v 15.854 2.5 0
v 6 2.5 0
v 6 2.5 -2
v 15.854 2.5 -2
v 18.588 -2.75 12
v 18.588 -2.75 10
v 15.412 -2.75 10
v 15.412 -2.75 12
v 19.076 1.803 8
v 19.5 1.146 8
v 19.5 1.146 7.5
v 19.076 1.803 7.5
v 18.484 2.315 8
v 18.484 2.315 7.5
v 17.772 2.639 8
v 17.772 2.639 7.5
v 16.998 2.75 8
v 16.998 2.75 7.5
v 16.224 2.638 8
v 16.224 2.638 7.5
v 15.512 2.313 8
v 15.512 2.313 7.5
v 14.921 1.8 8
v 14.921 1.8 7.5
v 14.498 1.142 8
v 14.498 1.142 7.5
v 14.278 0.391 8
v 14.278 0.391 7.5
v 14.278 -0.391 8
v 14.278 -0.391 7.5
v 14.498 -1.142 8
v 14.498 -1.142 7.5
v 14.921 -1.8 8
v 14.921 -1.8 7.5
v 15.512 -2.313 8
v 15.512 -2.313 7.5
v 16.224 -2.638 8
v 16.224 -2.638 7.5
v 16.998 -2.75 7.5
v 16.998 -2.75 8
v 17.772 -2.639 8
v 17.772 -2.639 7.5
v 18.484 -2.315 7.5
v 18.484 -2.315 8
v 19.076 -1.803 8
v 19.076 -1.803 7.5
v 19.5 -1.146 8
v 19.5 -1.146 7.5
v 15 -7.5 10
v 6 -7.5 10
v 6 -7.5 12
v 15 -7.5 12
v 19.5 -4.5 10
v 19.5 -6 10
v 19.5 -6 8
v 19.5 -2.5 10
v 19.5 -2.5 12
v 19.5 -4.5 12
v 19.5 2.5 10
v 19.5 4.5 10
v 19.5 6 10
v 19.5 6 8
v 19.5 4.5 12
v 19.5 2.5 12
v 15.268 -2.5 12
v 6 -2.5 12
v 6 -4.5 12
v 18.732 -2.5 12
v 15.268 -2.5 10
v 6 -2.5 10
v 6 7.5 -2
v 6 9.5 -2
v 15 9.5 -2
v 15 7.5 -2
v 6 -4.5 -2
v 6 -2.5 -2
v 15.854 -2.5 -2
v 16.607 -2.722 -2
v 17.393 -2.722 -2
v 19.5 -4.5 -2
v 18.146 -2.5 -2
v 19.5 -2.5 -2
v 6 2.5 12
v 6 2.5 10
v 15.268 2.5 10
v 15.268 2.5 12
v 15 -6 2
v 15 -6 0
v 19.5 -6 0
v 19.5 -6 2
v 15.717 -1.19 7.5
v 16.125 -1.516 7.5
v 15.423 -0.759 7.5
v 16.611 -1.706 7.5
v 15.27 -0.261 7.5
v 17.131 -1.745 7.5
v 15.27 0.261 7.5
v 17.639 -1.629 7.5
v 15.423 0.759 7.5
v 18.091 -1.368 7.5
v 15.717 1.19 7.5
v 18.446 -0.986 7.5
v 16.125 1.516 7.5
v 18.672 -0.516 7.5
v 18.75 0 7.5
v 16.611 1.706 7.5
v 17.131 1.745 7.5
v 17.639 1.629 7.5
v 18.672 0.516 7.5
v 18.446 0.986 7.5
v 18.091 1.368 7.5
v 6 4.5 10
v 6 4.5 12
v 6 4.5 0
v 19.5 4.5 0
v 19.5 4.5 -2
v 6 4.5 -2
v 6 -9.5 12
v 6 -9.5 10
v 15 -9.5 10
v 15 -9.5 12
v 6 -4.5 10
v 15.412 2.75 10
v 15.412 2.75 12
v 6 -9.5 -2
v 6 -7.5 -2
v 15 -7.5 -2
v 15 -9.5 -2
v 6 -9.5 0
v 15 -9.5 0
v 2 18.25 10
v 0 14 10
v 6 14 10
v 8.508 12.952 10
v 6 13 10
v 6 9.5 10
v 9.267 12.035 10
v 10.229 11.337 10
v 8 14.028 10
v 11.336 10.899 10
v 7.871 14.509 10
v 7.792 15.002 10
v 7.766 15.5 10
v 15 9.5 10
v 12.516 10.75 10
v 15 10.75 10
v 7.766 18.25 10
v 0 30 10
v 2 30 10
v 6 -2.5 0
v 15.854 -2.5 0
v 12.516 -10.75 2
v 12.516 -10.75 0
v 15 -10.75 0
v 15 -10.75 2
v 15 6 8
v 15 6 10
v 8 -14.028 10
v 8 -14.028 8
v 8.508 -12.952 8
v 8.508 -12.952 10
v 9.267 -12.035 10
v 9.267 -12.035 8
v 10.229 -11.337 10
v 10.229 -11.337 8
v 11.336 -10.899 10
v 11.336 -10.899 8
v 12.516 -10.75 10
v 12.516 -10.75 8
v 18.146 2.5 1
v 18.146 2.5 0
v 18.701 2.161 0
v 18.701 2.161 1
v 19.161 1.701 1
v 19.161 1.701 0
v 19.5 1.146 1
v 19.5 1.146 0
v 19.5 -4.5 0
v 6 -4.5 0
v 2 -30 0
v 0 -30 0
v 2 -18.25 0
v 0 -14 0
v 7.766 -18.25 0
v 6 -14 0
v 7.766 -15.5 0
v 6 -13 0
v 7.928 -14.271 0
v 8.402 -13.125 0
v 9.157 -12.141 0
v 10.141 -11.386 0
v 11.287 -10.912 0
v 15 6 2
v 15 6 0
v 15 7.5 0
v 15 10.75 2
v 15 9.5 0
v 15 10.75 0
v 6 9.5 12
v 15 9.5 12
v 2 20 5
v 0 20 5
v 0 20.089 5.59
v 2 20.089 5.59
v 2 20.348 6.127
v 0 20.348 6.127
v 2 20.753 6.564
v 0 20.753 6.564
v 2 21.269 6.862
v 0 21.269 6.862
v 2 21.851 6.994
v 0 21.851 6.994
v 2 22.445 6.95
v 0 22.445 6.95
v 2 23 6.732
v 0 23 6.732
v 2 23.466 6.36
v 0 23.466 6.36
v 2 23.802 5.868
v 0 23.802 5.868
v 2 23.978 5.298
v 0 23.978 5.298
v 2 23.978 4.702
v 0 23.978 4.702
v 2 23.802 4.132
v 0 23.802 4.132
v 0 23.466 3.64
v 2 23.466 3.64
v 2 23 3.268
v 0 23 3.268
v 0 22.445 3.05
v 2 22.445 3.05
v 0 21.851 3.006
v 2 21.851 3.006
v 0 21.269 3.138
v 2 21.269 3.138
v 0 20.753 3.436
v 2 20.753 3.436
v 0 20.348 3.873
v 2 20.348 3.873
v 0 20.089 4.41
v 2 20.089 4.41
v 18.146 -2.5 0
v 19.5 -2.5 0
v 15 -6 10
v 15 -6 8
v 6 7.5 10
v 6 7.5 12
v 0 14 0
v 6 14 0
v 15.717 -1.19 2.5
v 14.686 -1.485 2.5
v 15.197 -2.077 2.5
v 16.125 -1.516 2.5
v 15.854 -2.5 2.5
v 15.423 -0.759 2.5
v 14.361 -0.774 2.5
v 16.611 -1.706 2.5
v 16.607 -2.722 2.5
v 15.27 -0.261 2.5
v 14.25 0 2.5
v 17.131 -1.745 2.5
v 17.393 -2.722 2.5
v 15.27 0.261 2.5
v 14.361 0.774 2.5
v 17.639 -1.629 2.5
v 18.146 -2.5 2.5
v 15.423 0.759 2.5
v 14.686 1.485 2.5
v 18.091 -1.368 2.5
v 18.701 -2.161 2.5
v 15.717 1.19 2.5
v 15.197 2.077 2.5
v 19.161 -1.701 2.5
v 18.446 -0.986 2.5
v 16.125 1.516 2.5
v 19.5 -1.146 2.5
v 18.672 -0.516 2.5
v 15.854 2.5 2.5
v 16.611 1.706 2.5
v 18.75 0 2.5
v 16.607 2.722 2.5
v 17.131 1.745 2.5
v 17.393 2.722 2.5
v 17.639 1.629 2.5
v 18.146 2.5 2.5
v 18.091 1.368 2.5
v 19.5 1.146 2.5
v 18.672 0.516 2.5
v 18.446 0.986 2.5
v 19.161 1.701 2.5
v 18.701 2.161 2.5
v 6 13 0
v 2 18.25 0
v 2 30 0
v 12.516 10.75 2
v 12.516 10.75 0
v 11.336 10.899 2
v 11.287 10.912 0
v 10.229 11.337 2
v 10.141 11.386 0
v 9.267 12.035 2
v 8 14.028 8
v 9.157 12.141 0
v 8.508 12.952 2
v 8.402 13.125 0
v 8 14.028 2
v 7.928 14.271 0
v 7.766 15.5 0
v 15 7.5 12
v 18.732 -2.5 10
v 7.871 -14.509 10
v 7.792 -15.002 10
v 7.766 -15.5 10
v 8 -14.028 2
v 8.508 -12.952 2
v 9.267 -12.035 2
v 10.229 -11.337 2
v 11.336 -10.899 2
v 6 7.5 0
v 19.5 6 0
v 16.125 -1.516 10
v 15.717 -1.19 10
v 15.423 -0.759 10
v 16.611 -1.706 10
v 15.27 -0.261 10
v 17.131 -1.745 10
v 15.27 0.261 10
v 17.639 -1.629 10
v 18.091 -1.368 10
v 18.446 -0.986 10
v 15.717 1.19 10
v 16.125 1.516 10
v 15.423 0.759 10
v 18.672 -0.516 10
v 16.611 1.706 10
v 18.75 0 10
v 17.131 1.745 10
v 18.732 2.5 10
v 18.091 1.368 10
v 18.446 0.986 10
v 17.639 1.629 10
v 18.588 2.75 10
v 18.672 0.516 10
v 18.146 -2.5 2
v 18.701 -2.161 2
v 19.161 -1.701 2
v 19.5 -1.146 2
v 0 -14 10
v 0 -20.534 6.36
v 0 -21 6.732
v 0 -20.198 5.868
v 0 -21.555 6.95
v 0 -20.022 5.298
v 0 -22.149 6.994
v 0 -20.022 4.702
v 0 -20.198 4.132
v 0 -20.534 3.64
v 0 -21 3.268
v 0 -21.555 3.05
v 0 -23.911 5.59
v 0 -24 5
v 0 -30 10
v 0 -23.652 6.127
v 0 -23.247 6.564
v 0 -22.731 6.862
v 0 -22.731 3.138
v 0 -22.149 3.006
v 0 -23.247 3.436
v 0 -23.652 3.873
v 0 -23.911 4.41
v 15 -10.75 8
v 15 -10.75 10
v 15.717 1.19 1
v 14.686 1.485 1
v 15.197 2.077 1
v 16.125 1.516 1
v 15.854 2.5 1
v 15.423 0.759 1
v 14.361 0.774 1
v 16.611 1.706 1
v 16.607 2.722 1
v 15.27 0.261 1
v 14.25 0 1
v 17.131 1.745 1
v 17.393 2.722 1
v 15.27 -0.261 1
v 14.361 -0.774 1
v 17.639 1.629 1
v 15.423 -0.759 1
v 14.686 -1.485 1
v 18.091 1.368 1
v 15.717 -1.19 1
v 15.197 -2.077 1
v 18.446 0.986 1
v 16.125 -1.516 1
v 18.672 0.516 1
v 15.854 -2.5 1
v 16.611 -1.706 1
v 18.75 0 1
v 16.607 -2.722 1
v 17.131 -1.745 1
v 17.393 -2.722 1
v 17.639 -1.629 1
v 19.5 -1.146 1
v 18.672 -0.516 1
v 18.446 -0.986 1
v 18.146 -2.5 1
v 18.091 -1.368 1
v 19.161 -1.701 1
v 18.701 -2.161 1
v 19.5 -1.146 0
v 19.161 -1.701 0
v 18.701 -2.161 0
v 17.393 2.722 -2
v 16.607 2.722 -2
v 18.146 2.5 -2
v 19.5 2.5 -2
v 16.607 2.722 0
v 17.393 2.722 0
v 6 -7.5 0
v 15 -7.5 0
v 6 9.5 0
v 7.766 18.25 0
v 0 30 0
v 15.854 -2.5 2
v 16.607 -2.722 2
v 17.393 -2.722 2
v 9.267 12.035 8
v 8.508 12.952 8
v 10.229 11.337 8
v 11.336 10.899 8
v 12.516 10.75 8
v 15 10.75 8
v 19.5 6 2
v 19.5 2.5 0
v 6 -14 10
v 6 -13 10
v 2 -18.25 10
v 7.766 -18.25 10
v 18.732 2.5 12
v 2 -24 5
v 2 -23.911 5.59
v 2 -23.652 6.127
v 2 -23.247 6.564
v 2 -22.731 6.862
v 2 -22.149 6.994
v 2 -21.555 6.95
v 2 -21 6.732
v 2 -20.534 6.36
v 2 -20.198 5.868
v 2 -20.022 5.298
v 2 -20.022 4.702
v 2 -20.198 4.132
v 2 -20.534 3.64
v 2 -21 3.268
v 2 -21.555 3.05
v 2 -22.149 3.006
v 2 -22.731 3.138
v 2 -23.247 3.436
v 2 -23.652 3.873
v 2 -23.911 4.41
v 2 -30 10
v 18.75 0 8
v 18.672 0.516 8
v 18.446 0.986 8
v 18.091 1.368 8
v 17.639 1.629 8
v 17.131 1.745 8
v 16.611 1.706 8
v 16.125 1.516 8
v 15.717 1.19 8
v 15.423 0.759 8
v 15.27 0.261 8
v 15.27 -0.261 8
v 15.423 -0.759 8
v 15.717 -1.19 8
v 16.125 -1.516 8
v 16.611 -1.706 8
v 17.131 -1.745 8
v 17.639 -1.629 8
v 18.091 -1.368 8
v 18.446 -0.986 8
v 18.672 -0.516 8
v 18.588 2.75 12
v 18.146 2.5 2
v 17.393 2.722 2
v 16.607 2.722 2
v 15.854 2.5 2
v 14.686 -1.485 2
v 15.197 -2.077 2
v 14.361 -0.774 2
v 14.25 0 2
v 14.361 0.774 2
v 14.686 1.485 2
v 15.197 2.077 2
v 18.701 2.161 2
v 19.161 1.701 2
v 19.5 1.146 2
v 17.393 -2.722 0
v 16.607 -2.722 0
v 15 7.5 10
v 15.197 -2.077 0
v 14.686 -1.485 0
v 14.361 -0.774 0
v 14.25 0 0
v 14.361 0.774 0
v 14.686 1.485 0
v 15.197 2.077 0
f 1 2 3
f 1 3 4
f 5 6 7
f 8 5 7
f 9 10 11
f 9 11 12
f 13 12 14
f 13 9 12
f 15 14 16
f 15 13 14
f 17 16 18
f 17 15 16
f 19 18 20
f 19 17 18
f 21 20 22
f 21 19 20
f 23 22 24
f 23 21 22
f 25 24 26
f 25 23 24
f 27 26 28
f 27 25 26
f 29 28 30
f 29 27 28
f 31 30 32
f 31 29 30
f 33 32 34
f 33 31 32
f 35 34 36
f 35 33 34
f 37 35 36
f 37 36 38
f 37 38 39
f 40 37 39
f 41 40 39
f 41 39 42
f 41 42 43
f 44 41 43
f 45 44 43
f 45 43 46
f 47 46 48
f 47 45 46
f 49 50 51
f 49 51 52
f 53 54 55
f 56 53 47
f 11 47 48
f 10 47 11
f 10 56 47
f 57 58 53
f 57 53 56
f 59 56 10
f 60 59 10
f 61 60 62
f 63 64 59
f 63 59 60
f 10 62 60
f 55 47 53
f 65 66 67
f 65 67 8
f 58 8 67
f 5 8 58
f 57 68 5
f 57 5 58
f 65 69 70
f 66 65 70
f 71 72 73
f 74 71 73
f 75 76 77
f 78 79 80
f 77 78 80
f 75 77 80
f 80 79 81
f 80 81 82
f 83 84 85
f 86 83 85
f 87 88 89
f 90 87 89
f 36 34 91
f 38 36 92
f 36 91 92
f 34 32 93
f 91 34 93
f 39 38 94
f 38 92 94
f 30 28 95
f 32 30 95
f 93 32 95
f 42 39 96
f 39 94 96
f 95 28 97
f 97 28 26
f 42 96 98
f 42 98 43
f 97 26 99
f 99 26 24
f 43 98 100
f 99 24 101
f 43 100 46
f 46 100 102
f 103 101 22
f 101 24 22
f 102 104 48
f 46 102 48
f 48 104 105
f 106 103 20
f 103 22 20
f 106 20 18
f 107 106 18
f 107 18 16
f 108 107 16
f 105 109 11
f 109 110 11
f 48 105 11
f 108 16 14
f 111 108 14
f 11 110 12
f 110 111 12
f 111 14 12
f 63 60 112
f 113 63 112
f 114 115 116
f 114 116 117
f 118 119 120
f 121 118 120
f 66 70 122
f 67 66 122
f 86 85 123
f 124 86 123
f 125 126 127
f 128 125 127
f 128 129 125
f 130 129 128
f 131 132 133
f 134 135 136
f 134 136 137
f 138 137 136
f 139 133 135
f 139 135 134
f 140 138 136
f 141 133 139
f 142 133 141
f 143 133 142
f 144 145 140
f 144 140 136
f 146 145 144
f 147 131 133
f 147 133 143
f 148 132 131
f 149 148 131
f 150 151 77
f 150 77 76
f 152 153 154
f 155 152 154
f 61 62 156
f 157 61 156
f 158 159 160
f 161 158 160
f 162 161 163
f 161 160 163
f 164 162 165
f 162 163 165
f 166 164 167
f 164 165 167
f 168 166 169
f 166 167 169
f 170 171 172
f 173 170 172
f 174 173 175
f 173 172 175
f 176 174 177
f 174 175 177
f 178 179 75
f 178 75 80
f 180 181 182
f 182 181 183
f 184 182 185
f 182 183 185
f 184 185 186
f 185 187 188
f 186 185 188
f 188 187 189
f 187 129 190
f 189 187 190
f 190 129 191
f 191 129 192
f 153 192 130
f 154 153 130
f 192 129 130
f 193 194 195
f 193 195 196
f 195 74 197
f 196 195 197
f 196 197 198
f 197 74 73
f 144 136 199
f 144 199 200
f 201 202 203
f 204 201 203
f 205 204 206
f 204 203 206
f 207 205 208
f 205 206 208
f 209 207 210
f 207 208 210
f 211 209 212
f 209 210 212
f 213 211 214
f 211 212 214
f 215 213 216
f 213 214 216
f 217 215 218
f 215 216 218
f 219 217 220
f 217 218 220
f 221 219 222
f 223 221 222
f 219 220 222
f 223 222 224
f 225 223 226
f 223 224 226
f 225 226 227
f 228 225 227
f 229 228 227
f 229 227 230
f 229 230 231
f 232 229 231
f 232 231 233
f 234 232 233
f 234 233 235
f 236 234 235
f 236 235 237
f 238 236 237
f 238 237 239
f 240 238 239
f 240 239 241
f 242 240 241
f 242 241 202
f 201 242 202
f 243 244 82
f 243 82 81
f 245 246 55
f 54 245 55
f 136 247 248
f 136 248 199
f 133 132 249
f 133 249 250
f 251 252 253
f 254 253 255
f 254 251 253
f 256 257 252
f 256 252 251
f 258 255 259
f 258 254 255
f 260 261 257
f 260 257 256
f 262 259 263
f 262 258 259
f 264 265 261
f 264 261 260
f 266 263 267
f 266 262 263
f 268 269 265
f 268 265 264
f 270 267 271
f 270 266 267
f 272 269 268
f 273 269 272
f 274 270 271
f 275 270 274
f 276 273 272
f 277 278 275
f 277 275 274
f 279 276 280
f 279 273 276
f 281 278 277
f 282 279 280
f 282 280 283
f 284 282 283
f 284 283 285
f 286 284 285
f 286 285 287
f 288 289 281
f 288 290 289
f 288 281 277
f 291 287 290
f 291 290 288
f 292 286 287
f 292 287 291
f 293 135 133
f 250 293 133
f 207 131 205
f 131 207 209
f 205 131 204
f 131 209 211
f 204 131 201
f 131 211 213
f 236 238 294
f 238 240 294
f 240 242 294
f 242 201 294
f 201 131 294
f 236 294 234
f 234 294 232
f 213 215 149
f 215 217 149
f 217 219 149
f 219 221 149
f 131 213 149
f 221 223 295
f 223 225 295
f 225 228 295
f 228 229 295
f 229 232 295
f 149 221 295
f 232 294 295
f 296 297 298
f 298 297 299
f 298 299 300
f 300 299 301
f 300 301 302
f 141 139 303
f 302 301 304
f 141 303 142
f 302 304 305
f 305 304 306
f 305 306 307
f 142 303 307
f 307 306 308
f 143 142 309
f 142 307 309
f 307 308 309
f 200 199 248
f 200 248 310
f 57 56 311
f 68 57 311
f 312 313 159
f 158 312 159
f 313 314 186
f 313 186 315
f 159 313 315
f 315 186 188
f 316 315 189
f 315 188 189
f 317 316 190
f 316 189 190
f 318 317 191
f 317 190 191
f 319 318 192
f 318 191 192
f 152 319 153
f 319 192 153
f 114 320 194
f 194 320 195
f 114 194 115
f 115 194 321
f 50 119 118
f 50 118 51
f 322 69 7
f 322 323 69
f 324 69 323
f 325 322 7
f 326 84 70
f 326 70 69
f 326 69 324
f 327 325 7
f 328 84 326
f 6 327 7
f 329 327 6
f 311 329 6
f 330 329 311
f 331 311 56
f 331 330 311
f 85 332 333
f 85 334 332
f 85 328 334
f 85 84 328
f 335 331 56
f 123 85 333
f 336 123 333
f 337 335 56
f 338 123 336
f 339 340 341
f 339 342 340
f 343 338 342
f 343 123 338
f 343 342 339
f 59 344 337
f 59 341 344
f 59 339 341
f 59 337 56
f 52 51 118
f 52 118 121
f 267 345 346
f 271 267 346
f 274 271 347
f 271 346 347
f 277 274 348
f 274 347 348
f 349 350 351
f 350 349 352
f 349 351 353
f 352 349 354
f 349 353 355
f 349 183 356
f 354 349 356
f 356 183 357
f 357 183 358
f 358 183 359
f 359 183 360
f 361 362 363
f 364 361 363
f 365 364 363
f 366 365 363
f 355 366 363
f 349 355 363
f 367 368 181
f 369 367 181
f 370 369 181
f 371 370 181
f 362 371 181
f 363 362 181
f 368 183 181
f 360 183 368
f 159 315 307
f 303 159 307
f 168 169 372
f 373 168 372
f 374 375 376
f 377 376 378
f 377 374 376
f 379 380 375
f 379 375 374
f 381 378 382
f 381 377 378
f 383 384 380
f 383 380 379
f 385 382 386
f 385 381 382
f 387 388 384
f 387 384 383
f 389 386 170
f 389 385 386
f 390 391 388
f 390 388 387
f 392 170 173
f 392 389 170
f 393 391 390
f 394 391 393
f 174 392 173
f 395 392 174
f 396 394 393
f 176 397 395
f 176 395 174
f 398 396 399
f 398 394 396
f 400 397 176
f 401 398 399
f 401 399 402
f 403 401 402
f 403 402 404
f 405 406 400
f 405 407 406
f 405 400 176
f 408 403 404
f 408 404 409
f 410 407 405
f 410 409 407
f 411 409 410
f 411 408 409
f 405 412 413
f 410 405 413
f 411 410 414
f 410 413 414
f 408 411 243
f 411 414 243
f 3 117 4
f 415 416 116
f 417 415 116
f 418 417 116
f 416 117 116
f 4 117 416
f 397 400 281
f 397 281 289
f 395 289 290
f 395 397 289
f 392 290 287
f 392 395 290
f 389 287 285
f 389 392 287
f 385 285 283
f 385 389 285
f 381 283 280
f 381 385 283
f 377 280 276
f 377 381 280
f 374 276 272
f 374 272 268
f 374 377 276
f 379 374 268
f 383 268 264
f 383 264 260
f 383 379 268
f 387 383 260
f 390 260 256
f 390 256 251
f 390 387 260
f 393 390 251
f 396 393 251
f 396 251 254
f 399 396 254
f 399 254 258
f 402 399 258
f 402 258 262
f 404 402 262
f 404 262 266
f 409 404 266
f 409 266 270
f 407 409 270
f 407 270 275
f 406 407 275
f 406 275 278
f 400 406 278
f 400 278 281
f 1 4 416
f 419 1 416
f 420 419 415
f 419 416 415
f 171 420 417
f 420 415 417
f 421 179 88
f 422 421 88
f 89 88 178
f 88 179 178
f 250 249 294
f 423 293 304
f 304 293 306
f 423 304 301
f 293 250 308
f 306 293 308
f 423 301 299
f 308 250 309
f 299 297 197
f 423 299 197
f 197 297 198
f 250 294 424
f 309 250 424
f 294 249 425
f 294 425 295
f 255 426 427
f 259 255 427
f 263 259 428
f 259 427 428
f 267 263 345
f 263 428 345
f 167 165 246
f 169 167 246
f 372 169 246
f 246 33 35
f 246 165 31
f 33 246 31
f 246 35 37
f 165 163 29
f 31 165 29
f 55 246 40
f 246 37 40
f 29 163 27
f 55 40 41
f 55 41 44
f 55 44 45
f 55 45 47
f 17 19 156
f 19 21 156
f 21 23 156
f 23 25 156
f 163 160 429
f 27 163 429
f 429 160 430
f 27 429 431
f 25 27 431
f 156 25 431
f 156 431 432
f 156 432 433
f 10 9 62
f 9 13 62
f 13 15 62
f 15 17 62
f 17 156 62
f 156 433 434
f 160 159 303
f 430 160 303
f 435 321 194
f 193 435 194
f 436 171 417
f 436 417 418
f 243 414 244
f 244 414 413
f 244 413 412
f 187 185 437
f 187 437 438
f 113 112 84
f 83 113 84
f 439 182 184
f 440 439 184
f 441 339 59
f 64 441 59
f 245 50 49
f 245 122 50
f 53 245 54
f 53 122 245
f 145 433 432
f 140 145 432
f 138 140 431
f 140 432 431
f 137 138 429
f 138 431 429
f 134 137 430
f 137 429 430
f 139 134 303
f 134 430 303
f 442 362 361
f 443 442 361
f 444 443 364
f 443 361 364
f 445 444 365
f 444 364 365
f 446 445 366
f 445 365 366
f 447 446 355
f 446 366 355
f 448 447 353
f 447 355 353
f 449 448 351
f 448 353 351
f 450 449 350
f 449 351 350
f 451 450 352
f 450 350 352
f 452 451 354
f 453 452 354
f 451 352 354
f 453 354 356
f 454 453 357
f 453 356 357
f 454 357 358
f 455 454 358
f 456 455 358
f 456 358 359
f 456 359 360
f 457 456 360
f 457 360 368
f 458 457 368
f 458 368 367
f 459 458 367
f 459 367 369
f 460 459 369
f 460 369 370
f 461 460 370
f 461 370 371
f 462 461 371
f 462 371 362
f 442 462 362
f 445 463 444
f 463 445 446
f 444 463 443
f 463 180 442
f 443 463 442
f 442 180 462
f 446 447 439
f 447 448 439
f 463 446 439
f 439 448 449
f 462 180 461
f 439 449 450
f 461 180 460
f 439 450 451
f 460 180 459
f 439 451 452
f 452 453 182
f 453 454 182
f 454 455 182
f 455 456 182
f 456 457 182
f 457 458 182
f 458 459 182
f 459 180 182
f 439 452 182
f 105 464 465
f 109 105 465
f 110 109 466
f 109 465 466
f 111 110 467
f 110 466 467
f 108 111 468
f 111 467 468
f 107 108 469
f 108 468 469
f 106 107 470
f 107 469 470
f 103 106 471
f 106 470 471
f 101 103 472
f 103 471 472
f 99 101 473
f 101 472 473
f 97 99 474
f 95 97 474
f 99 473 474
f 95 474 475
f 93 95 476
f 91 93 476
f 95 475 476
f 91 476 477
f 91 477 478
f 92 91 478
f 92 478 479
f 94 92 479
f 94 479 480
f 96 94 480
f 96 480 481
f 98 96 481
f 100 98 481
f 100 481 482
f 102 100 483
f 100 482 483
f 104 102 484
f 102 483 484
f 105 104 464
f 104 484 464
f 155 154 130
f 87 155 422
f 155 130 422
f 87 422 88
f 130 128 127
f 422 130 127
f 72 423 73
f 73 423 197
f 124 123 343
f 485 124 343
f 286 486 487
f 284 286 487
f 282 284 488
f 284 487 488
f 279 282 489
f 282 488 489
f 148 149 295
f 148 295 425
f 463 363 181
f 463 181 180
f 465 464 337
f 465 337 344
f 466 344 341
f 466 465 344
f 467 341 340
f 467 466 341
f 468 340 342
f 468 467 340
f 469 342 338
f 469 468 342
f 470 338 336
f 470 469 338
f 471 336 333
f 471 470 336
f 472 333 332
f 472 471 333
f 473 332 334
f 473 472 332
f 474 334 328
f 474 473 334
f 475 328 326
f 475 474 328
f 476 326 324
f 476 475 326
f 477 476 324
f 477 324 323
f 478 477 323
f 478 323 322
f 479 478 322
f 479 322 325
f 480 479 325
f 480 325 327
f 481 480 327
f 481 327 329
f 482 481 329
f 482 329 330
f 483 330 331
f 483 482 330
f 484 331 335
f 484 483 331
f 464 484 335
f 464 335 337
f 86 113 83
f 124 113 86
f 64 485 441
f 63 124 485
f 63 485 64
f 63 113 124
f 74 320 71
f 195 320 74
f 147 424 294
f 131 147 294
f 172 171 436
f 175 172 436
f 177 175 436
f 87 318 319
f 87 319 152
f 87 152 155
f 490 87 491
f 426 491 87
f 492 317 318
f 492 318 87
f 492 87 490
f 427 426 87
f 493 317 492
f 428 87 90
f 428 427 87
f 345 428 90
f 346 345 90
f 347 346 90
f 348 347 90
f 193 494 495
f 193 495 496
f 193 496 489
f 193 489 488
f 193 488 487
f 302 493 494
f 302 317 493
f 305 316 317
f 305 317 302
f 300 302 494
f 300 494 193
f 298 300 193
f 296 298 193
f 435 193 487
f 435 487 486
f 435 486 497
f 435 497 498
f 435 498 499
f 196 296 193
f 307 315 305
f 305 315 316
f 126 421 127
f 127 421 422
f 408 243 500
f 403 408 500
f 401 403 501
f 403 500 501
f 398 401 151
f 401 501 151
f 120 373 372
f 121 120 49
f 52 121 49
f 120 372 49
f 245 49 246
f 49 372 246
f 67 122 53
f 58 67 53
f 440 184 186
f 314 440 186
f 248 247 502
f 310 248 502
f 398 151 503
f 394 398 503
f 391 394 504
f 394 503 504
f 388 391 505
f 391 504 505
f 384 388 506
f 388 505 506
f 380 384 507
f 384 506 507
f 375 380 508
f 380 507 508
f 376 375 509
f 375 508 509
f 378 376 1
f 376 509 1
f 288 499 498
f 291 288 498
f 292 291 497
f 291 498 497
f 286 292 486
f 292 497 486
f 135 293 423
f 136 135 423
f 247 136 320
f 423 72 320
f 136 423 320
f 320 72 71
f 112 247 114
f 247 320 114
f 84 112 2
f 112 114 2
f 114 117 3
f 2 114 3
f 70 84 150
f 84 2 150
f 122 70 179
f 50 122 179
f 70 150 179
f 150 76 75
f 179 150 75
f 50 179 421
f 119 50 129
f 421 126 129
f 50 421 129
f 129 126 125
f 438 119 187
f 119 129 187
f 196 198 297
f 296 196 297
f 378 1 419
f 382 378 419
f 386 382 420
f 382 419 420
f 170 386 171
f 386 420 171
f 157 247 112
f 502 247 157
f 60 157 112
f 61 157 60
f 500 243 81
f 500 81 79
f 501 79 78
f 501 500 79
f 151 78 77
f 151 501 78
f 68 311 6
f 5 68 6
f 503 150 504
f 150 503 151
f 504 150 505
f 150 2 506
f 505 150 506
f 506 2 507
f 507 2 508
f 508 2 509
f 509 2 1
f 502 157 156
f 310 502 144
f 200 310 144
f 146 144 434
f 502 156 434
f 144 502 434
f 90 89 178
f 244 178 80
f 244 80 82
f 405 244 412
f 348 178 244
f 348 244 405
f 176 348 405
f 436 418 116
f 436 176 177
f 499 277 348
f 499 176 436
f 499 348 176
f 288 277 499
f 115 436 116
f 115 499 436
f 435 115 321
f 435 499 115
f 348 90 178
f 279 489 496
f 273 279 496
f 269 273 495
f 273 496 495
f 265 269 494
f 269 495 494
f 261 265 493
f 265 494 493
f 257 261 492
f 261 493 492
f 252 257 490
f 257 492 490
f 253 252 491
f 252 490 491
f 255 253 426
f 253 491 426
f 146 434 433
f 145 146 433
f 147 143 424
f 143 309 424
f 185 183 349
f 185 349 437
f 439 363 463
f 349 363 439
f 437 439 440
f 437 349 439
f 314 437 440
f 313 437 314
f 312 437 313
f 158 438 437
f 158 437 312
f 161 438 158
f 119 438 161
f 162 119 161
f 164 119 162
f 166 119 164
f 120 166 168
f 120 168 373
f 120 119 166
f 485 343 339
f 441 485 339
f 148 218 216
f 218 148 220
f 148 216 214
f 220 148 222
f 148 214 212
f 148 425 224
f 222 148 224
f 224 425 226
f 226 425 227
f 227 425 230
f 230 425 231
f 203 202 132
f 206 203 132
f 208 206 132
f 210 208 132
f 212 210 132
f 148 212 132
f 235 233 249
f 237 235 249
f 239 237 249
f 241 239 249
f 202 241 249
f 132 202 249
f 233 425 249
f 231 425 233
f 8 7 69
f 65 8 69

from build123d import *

# Parameters (mm, degrees)
F0_W      = 15
F0_H      = 2
F0_R      = 1.75
F1_DEPTH  = 2
F2_DEPTH  = 2
F3_DEPTH  = 2.5
F4_W      = 6
F4_H      = 26
F5_DEPTH  = 7
F6_DEPTH  = 6
F7_R      = 1.75
F8_DEPTH  = 2
F9_DEPTH  = 0.5
F10_W     = 9
F10_H     = 2
F11_DEPTH = 2
F12_R     = 2
F13_DEPTH = 25
F14_R     = 1.75
F15_DEPTH = 1
F16_W     = 6
F16_H     = 1
F17_DEPTH = 15


with BuildPart() as f1:
    # F0 (on Top) → F1 (new body)
    with BuildSketch(Plane.XY):
        with BuildLine():
            Line((15, -9.5), (0, -9.5))
            Line((0, -9.5), (0, -30))
            Line((0, -30), (2, -30))
            Line((2, -30), (2, -18.25))
            Line((2, -18.25), (7.7660733269, -18.25))
            Line((7.7660733269, -18.25), (7.7660733269, -15.5))
            ThreePointArc((7.7660733269, -15.5), (9.1573161163, -12.1412427894), (12.5160733269, -10.75))
            Line((12.5160733269, -10.75), (15, -10.75))
            Line((15, -10.75), (15, -9.5))
        make_face()
        with BuildLine():
            Line((0, 30), (0, 9.5))
            Line((0, 9.5), (15, 9.5))
            Line((15, 9.5), (15, 10.75))
            Line((15, 10.75), (12.5160733269, 10.75))
            ThreePointArc((12.5160733269, 10.75), (9.1573161163, 12.1412427894), (7.7660733269, 15.5))
            Line((7.7660733269, 15.5), (7.7660733269, 18.25))
            Line((7.7660733269, 18.25), (2, 18.25))
            Line((2, 18.25), (2, 30))
            Line((2, 30), (0, 30))
        make_face()
        Polygon((19.5, -5.8877859777), (19.5, -4.617), (19.5, -4.5), (0, -4.5), (0, -7.5), (15, -7.5), (15, -7), (15, -6), (19.5, -6), align=None)
        with BuildLine():
            Line((18.1456439237, -2.5), (19.5, -2.5))
            Line((19.5, -2.5), (19.5, -1.1456439237))
            ThreePointArc((19.5, -1.1456439237), (18.9445436483, -1.9445436483), (18.1456439237, -2.5))
        make_face()
        with Locations((7.5, -8.5)):
            Rectangle(F0_W, F0_H)
        with Locations((7.5, 8.5)):
            Rectangle(F0_W, F0_H)
        Polygon((0, 7.5), (0, 4.5), (19.5, 4.5), (19.5, 4.617), (19.5, 5.8877859777), (19.5, 6), (15, 6), (15, 7), (15, 7.5), align=None)
        with BuildLine():
            ThreePointArc((18.1456439237, 2.5), (18.9445436483, 1.9445436483), (19.5, 1.1456439237))
            Line((19.5, 1.1456439237), (19.5, 2.5))
            Line((19.5, 2.5), (18.1456439237, 2.5))
        make_face()
        with BuildLine():
            Line((0, 0), (0, -2.5))
            Line((0, -2.5), (15.8543560763, -2.5))
            ThreePointArc((15.8543560763, -2.5), (14.25, 0), (15.8543560763, 2.5))
            Line((15.8543560763, 2.5), (0, 2.5))
            Line((0, 2.5), (0, 0))
        make_face()
        with BuildLine():
            Line((0, -4.5), (19.5, -4.5))
            Line((19.5, -4.5), (19.5, -2.5))
            Line((19.5, -2.5), (18.1456439237, -2.5))
            ThreePointArc((18.1456439237, -2.5), (17, -2.75), (15.8543560763, -2.5))
            Line((15.8543560763, -2.5), (0, -2.5))
            Line((0, -2.5), (0, -4.5))
        make_face()
        with BuildLine():
            Line((0, 2.5), (15.8543560763, 2.5))
            ThreePointArc((15.8543560763, 2.5), (17, 2.75), (18.1456439237, 2.5))
            Line((18.1456439237, 2.5), (19.5, 2.5))
            Line((19.5, 2.5), (19.5, 4.5))
            Line((19.5, 4.5), (0, 4.5))
            Line((0, 4.5), (0, 2.5))
        make_face()
        with BuildLine():
            ThreePointArc((18.1456439237, -2.5), (18.9445436483, -1.9445436483), (19.5, -1.1456439237))
            Line((19.5, -1.1456439237), (19.5, 0.8877859777))
            Line((19.5, 0.8877859777), (19.5, 1.1456439237))
            ThreePointArc((19.5, 1.1456439237), (18.9445436483, 1.9445436483), (18.1456439237, 2.5))
            Line((18.1456439237, 2.5), (15.8543560763, 2.5))
            ThreePointArc((15.8543560763, 2.5), (14.25, 0), (15.8543560763, -2.5))
            Line((15.8543560763, -2.5), (18.1456439237, -2.5))
        make_face()
        with Locations((17, 0)):
            Circle(F0_R, mode=Mode.SUBTRACT)
    extrude(amount=F1_DEPTH)

    # F0 (on Top) → F2 (join)
    with BuildSketch(Plane.XY):
        with Locations((7.5, -8.5)):
            Rectangle(F0_W, F0_H)
        with BuildLine():
            Line((0, -4.5), (19.5, -4.5))
            Line((19.5, -4.5), (19.5, -2.5))
            Line((19.5, -2.5), (18.1456439237, -2.5))
            ThreePointArc((18.1456439237, -2.5), (17, -2.75), (15.8543560763, -2.5))
            Line((15.8543560763, -2.5), (0, -2.5))
            Line((0, -2.5), (0, -4.5))
        make_face()
        with BuildLine():
            Line((0, 2.5), (15.8543560763, 2.5))
            ThreePointArc((15.8543560763, 2.5), (17, 2.75), (18.1456439237, 2.5))
            Line((18.1456439237, 2.5), (19.5, 2.5))
            Line((19.5, 2.5), (19.5, 4.5))
            Line((19.5, 4.5), (0, 4.5))
            Line((0, 4.5), (0, 2.5))
        make_face()
        with Locations((7.5, 8.5)):
            Rectangle(F0_W, F0_H)
    extrude(amount=-F2_DEPTH)

    # F0 (on Top) → F3 (join)
    with BuildSketch(Plane.XY):
        with BuildLine():
            ThreePointArc((18.1456439237, -2.5), (18.9445436483, -1.9445436483), (19.5, -1.1456439237))
            Line((19.5, -1.1456439237), (19.5, 0.8877859777))
            Line((19.5, 0.8877859777), (19.5, 1.1456439237))
            ThreePointArc((19.5, 1.1456439237), (18.9445436483, 1.9445436483), (18.1456439237, 2.5))
            Line((18.1456439237, 2.5), (15.8543560763, 2.5))
            ThreePointArc((15.8543560763, 2.5), (14.25, 0), (15.8543560763, -2.5))
            Line((15.8543560763, -2.5), (18.1456439237, -2.5))
        make_face()
        with Locations((17, 0)):
            Circle(F0_R, mode=Mode.SUBTRACT)
        with BuildLine():
            ThreePointArc((15.8543560763, -2.5), (17, -2.75), (18.1456439237, -2.5))
            Line((18.1456439237, -2.5), (15.8543560763, -2.5))
        make_face()
        with BuildLine():
            ThreePointArc((18.1456439237, 2.5), (17, 2.75), (15.8543560763, 2.5))
            Line((15.8543560763, 2.5), (18.1456439237, 2.5))
        make_face()
    extrude(amount=F3_DEPTH)

    # F4 (on face) → F5 (cut)
    with BuildSketch(Plane.XY.offset(2)):
        with Locations((3, 0)):
            Rectangle(F4_W, F4_H)
    extrude(amount=-F5_DEPTH, mode=Mode.SUBTRACT)

    # F4 (on face) → F6 (join)
    with BuildSketch(Plane.XY.offset(2)):
        with BuildLine():
            Line((8, -7.5), (8, -4.5))
            Line((8, -4.5), (8, -2.5))
            Line((8, -2.5), (8, 2.5))
            Line((8, 2.5), (8, 4.5))
            Line((8, 4.5), (8, 7.5))
            Line((8, 7.5), (8, 9.5))
            Line((8, 9.5), (8, 14.0277290651))
            ThreePointArc((8, 14.0277290651), (7.8249195082, 14.7546303947), (7.7660733269, 15.5))
            Line((7.7660733269, 15.5), (7.7660733269, 18.25))
            Line((7.7660733269, 18.25), (2, 18.25))
            Line((2, 18.25), (2, 30))
            Line((2, 30), (0, 30))
            Line((0, 30), (0, 13))
            Line((0, 13), (6, 13))
            Line((6, 13), (6, -13))
            Line((6, -13), (0, -13))
            Line((0, -13), (0, -30))
            Line((0, -30), (2, -30))
            Line((2, -30), (2, -18.25))
            Line((2, -18.25), (7.7660733269, -18.25))
            Line((7.7660733269, -18.25), (7.7660733269, -15.5))
            ThreePointArc((7.7660733269, -15.5), (7.8249195082, -14.7546303947), (8, -14.0277290651))
            Line((8, -14.0277290651), (8, -9.5))
            Line((8, -9.5), (8, -7.5))
        make_face()
    extrude(amount=F6_DEPTH)

    # F7 (on face) → F8 (join)
    with BuildSketch(Plane.XY.offset(8)):
        with BuildLine():
            ThreePointArc((7.7660733269, -15.5), (7.8249195082, -14.7546303947), (8, -14.0277290651))
            Line((8, -14.0277290651), (8, 14.0277290651))
            ThreePointArc((8, 14.0277290651), (7.8249195082, 14.7546303947), (7.7660733269, 15.5))
            Line((7.7660733269, 15.5), (7.7660733269, 18.25))
            Line((7.7660733269, 18.25), (2, 18.25))
            Line((2, 18.25), (2, 30))
            Line((2, 30), (0, 30))
            Line((0, 30), (0, 13))
            Line((0, 13), (6, 13))
            Line((6, 13), (6, -13))
            Line((6, -13), (0, -13))
            Line((0, -13), (0, -30))
            Line((0, -30), (2, -30))
            Line((2, -30), (2, -18.25))
            Line((2, -18.25), (7.7660733269, -18.25))
            Line((7.7660733269, -18.25), (7.7660733269, -15.5))
        make_face()
        with BuildLine():
            Line((19.5, -5.8877859777), (19.5, -4.617))
            Line((19.5, -4.617), (19.5, -1.1456439237))
            ThreePointArc((19.5, -1.1456439237), (14.25, 0), (19.5, 1.1456439237))
            Line((19.5, 1.1456439237), (19.5, 4.617))
            Line((19.5, 4.617), (19.5, 5.8877859777))
            Line((19.5, 5.8877859777), (19.5, 6))
            Line((19.5, 6), (15, 6))
            Line((15, 6), (15, 7))
            Line((15, 7), (15, 10.75))
            Line((15, 10.75), (12.5160733269, 10.75))
            ThreePointArc((12.5160733269, 10.75), (9.7259825525, 11.6557974207), (8, 14.0277290651))
            Line((8, 14.0277290651), (8, -14.0277290651))
            ThreePointArc((8, -14.0277290651), (9.7259825525, -11.6557974207), (12.5160733269, -10.75))
            Line((12.5160733269, -10.75), (15, -10.75))
            Line((15, -10.75), (15, -7))
            Line((15, -7), (15, -6))
            Line((15, -6), (19.5, -6))
            Line((19.5, -6), (19.5, -5.8877859777))
        make_face()
        with BuildLine():
            ThreePointArc((19.5, 1.1456439237), (14.25, 0), (19.5, -1.1456439237))
            Line((19.5, -1.1456439237), (19.5, 0.8877859777))
            Line((19.5, 0.8877859777), (19.5, 1.1456439237))
        make_face()
        with Locations((17, 0)):
            Circle(F7_R, mode=Mode.SUBTRACT)
    extrude(amount=F8_DEPTH)

    # F7 (on face) → F9 (join)
    with BuildSketch(Plane.XY.offset(8)):
        with BuildLine():
            ThreePointArc((19.5, 1.1456439237), (14.25, 0), (19.5, -1.1456439237))
            Line((19.5, -1.1456439237), (19.5, 0.8877859777))
            Line((19.5, 0.8877859777), (19.5, 1.1456439237))
        make_face()
        with Locations((17, 0)):
            Circle(F7_R, mode=Mode.SUBTRACT)
    extrude(amount=-F9_DEPTH)

    # F10 (on face) → F11 (join)
    with BuildSketch(Plane.XY.offset(10)):
        with Locations((10.5, 8.5)):
            Rectangle(F10_W, F10_H)
        Polygon((6, 4.5), (6, 2.5), (15.2679491924, 2.5), (15.4122867597, 2.75), (18.5877132403, 2.75), (18.7320508076, 2.5), (19.5, 2.5), (19.5, 4.5), align=None)
        Polygon((6, -4.5), (19.5, -4.5), (19.5, -2.5), (18.7320508076, -2.5), (18.5877132403, -2.75), (15.4122867597, -2.75), (15.2679491924, -2.5), (6, -2.5), align=None)
        with Locations((10.5, -8.5)):
            Rectangle(F10_W, F10_H)
    extrude(amount=F11_DEPTH)

    # F12 (on face) → F13 (cut)
    with BuildSketch(Plane(origin=(0, 0, 0), x_dir=(0, -1, 0), z_dir=(-1, 0, 0))):
        with Locations((-22, 5)):
            Circle(F12_R)
        with Locations((22, 5)):
            Circle(F12_R)
    extrude(amount=-F13_DEPTH, mode=Mode.SUBTRACT)

    # F14 (on face) → F15 (cut)
    with BuildSketch(Plane(origin=(0, 0, 0), x_dir=(1, 0, 0), z_dir=(0, 0, -1))):
        with BuildLine():
            ThreePointArc((19.5, 1.1456439237), (18.9445436483, 1.9445436483), (18.1456439237, 2.5))
            ThreePointArc((18.1456439237, 2.5), (17, 2.75), (15.8543560763, 2.5))
            ThreePointArc((15.8543560763, 2.5), (14.25, 0), (15.8543560763, -2.5))
            ThreePointArc((15.8543560763, -2.5), (17, -2.75), (18.1456439237, -2.5))
            ThreePointArc((18.1456439237, -2.5), (18.9445436483, -1.9445436483), (19.5, -1.1456439237))
            Line((19.5, -1.1456439237), (19.5, 1.1456439237))
        make_face()
        with Locations((17, 0)):
            Circle(F14_R, mode=Mode.SUBTRACT)
    extrude(amount=-F15_DEPTH, mode=Mode.SUBTRACT)

    # F16 (on face) → F17 (cut, symmetric)
    with BuildSketch(Plane.XY.offset(8)):
        with Locations((3, -13.5)):
            Rectangle(F16_W, F16_H)
        with Locations((3, 13.5)):
            Rectangle(F16_W, F16_H)
    extrude(amount=F17_DEPTH, both=True, mode=Mode.SUBTRACT)


solid = f1.part
